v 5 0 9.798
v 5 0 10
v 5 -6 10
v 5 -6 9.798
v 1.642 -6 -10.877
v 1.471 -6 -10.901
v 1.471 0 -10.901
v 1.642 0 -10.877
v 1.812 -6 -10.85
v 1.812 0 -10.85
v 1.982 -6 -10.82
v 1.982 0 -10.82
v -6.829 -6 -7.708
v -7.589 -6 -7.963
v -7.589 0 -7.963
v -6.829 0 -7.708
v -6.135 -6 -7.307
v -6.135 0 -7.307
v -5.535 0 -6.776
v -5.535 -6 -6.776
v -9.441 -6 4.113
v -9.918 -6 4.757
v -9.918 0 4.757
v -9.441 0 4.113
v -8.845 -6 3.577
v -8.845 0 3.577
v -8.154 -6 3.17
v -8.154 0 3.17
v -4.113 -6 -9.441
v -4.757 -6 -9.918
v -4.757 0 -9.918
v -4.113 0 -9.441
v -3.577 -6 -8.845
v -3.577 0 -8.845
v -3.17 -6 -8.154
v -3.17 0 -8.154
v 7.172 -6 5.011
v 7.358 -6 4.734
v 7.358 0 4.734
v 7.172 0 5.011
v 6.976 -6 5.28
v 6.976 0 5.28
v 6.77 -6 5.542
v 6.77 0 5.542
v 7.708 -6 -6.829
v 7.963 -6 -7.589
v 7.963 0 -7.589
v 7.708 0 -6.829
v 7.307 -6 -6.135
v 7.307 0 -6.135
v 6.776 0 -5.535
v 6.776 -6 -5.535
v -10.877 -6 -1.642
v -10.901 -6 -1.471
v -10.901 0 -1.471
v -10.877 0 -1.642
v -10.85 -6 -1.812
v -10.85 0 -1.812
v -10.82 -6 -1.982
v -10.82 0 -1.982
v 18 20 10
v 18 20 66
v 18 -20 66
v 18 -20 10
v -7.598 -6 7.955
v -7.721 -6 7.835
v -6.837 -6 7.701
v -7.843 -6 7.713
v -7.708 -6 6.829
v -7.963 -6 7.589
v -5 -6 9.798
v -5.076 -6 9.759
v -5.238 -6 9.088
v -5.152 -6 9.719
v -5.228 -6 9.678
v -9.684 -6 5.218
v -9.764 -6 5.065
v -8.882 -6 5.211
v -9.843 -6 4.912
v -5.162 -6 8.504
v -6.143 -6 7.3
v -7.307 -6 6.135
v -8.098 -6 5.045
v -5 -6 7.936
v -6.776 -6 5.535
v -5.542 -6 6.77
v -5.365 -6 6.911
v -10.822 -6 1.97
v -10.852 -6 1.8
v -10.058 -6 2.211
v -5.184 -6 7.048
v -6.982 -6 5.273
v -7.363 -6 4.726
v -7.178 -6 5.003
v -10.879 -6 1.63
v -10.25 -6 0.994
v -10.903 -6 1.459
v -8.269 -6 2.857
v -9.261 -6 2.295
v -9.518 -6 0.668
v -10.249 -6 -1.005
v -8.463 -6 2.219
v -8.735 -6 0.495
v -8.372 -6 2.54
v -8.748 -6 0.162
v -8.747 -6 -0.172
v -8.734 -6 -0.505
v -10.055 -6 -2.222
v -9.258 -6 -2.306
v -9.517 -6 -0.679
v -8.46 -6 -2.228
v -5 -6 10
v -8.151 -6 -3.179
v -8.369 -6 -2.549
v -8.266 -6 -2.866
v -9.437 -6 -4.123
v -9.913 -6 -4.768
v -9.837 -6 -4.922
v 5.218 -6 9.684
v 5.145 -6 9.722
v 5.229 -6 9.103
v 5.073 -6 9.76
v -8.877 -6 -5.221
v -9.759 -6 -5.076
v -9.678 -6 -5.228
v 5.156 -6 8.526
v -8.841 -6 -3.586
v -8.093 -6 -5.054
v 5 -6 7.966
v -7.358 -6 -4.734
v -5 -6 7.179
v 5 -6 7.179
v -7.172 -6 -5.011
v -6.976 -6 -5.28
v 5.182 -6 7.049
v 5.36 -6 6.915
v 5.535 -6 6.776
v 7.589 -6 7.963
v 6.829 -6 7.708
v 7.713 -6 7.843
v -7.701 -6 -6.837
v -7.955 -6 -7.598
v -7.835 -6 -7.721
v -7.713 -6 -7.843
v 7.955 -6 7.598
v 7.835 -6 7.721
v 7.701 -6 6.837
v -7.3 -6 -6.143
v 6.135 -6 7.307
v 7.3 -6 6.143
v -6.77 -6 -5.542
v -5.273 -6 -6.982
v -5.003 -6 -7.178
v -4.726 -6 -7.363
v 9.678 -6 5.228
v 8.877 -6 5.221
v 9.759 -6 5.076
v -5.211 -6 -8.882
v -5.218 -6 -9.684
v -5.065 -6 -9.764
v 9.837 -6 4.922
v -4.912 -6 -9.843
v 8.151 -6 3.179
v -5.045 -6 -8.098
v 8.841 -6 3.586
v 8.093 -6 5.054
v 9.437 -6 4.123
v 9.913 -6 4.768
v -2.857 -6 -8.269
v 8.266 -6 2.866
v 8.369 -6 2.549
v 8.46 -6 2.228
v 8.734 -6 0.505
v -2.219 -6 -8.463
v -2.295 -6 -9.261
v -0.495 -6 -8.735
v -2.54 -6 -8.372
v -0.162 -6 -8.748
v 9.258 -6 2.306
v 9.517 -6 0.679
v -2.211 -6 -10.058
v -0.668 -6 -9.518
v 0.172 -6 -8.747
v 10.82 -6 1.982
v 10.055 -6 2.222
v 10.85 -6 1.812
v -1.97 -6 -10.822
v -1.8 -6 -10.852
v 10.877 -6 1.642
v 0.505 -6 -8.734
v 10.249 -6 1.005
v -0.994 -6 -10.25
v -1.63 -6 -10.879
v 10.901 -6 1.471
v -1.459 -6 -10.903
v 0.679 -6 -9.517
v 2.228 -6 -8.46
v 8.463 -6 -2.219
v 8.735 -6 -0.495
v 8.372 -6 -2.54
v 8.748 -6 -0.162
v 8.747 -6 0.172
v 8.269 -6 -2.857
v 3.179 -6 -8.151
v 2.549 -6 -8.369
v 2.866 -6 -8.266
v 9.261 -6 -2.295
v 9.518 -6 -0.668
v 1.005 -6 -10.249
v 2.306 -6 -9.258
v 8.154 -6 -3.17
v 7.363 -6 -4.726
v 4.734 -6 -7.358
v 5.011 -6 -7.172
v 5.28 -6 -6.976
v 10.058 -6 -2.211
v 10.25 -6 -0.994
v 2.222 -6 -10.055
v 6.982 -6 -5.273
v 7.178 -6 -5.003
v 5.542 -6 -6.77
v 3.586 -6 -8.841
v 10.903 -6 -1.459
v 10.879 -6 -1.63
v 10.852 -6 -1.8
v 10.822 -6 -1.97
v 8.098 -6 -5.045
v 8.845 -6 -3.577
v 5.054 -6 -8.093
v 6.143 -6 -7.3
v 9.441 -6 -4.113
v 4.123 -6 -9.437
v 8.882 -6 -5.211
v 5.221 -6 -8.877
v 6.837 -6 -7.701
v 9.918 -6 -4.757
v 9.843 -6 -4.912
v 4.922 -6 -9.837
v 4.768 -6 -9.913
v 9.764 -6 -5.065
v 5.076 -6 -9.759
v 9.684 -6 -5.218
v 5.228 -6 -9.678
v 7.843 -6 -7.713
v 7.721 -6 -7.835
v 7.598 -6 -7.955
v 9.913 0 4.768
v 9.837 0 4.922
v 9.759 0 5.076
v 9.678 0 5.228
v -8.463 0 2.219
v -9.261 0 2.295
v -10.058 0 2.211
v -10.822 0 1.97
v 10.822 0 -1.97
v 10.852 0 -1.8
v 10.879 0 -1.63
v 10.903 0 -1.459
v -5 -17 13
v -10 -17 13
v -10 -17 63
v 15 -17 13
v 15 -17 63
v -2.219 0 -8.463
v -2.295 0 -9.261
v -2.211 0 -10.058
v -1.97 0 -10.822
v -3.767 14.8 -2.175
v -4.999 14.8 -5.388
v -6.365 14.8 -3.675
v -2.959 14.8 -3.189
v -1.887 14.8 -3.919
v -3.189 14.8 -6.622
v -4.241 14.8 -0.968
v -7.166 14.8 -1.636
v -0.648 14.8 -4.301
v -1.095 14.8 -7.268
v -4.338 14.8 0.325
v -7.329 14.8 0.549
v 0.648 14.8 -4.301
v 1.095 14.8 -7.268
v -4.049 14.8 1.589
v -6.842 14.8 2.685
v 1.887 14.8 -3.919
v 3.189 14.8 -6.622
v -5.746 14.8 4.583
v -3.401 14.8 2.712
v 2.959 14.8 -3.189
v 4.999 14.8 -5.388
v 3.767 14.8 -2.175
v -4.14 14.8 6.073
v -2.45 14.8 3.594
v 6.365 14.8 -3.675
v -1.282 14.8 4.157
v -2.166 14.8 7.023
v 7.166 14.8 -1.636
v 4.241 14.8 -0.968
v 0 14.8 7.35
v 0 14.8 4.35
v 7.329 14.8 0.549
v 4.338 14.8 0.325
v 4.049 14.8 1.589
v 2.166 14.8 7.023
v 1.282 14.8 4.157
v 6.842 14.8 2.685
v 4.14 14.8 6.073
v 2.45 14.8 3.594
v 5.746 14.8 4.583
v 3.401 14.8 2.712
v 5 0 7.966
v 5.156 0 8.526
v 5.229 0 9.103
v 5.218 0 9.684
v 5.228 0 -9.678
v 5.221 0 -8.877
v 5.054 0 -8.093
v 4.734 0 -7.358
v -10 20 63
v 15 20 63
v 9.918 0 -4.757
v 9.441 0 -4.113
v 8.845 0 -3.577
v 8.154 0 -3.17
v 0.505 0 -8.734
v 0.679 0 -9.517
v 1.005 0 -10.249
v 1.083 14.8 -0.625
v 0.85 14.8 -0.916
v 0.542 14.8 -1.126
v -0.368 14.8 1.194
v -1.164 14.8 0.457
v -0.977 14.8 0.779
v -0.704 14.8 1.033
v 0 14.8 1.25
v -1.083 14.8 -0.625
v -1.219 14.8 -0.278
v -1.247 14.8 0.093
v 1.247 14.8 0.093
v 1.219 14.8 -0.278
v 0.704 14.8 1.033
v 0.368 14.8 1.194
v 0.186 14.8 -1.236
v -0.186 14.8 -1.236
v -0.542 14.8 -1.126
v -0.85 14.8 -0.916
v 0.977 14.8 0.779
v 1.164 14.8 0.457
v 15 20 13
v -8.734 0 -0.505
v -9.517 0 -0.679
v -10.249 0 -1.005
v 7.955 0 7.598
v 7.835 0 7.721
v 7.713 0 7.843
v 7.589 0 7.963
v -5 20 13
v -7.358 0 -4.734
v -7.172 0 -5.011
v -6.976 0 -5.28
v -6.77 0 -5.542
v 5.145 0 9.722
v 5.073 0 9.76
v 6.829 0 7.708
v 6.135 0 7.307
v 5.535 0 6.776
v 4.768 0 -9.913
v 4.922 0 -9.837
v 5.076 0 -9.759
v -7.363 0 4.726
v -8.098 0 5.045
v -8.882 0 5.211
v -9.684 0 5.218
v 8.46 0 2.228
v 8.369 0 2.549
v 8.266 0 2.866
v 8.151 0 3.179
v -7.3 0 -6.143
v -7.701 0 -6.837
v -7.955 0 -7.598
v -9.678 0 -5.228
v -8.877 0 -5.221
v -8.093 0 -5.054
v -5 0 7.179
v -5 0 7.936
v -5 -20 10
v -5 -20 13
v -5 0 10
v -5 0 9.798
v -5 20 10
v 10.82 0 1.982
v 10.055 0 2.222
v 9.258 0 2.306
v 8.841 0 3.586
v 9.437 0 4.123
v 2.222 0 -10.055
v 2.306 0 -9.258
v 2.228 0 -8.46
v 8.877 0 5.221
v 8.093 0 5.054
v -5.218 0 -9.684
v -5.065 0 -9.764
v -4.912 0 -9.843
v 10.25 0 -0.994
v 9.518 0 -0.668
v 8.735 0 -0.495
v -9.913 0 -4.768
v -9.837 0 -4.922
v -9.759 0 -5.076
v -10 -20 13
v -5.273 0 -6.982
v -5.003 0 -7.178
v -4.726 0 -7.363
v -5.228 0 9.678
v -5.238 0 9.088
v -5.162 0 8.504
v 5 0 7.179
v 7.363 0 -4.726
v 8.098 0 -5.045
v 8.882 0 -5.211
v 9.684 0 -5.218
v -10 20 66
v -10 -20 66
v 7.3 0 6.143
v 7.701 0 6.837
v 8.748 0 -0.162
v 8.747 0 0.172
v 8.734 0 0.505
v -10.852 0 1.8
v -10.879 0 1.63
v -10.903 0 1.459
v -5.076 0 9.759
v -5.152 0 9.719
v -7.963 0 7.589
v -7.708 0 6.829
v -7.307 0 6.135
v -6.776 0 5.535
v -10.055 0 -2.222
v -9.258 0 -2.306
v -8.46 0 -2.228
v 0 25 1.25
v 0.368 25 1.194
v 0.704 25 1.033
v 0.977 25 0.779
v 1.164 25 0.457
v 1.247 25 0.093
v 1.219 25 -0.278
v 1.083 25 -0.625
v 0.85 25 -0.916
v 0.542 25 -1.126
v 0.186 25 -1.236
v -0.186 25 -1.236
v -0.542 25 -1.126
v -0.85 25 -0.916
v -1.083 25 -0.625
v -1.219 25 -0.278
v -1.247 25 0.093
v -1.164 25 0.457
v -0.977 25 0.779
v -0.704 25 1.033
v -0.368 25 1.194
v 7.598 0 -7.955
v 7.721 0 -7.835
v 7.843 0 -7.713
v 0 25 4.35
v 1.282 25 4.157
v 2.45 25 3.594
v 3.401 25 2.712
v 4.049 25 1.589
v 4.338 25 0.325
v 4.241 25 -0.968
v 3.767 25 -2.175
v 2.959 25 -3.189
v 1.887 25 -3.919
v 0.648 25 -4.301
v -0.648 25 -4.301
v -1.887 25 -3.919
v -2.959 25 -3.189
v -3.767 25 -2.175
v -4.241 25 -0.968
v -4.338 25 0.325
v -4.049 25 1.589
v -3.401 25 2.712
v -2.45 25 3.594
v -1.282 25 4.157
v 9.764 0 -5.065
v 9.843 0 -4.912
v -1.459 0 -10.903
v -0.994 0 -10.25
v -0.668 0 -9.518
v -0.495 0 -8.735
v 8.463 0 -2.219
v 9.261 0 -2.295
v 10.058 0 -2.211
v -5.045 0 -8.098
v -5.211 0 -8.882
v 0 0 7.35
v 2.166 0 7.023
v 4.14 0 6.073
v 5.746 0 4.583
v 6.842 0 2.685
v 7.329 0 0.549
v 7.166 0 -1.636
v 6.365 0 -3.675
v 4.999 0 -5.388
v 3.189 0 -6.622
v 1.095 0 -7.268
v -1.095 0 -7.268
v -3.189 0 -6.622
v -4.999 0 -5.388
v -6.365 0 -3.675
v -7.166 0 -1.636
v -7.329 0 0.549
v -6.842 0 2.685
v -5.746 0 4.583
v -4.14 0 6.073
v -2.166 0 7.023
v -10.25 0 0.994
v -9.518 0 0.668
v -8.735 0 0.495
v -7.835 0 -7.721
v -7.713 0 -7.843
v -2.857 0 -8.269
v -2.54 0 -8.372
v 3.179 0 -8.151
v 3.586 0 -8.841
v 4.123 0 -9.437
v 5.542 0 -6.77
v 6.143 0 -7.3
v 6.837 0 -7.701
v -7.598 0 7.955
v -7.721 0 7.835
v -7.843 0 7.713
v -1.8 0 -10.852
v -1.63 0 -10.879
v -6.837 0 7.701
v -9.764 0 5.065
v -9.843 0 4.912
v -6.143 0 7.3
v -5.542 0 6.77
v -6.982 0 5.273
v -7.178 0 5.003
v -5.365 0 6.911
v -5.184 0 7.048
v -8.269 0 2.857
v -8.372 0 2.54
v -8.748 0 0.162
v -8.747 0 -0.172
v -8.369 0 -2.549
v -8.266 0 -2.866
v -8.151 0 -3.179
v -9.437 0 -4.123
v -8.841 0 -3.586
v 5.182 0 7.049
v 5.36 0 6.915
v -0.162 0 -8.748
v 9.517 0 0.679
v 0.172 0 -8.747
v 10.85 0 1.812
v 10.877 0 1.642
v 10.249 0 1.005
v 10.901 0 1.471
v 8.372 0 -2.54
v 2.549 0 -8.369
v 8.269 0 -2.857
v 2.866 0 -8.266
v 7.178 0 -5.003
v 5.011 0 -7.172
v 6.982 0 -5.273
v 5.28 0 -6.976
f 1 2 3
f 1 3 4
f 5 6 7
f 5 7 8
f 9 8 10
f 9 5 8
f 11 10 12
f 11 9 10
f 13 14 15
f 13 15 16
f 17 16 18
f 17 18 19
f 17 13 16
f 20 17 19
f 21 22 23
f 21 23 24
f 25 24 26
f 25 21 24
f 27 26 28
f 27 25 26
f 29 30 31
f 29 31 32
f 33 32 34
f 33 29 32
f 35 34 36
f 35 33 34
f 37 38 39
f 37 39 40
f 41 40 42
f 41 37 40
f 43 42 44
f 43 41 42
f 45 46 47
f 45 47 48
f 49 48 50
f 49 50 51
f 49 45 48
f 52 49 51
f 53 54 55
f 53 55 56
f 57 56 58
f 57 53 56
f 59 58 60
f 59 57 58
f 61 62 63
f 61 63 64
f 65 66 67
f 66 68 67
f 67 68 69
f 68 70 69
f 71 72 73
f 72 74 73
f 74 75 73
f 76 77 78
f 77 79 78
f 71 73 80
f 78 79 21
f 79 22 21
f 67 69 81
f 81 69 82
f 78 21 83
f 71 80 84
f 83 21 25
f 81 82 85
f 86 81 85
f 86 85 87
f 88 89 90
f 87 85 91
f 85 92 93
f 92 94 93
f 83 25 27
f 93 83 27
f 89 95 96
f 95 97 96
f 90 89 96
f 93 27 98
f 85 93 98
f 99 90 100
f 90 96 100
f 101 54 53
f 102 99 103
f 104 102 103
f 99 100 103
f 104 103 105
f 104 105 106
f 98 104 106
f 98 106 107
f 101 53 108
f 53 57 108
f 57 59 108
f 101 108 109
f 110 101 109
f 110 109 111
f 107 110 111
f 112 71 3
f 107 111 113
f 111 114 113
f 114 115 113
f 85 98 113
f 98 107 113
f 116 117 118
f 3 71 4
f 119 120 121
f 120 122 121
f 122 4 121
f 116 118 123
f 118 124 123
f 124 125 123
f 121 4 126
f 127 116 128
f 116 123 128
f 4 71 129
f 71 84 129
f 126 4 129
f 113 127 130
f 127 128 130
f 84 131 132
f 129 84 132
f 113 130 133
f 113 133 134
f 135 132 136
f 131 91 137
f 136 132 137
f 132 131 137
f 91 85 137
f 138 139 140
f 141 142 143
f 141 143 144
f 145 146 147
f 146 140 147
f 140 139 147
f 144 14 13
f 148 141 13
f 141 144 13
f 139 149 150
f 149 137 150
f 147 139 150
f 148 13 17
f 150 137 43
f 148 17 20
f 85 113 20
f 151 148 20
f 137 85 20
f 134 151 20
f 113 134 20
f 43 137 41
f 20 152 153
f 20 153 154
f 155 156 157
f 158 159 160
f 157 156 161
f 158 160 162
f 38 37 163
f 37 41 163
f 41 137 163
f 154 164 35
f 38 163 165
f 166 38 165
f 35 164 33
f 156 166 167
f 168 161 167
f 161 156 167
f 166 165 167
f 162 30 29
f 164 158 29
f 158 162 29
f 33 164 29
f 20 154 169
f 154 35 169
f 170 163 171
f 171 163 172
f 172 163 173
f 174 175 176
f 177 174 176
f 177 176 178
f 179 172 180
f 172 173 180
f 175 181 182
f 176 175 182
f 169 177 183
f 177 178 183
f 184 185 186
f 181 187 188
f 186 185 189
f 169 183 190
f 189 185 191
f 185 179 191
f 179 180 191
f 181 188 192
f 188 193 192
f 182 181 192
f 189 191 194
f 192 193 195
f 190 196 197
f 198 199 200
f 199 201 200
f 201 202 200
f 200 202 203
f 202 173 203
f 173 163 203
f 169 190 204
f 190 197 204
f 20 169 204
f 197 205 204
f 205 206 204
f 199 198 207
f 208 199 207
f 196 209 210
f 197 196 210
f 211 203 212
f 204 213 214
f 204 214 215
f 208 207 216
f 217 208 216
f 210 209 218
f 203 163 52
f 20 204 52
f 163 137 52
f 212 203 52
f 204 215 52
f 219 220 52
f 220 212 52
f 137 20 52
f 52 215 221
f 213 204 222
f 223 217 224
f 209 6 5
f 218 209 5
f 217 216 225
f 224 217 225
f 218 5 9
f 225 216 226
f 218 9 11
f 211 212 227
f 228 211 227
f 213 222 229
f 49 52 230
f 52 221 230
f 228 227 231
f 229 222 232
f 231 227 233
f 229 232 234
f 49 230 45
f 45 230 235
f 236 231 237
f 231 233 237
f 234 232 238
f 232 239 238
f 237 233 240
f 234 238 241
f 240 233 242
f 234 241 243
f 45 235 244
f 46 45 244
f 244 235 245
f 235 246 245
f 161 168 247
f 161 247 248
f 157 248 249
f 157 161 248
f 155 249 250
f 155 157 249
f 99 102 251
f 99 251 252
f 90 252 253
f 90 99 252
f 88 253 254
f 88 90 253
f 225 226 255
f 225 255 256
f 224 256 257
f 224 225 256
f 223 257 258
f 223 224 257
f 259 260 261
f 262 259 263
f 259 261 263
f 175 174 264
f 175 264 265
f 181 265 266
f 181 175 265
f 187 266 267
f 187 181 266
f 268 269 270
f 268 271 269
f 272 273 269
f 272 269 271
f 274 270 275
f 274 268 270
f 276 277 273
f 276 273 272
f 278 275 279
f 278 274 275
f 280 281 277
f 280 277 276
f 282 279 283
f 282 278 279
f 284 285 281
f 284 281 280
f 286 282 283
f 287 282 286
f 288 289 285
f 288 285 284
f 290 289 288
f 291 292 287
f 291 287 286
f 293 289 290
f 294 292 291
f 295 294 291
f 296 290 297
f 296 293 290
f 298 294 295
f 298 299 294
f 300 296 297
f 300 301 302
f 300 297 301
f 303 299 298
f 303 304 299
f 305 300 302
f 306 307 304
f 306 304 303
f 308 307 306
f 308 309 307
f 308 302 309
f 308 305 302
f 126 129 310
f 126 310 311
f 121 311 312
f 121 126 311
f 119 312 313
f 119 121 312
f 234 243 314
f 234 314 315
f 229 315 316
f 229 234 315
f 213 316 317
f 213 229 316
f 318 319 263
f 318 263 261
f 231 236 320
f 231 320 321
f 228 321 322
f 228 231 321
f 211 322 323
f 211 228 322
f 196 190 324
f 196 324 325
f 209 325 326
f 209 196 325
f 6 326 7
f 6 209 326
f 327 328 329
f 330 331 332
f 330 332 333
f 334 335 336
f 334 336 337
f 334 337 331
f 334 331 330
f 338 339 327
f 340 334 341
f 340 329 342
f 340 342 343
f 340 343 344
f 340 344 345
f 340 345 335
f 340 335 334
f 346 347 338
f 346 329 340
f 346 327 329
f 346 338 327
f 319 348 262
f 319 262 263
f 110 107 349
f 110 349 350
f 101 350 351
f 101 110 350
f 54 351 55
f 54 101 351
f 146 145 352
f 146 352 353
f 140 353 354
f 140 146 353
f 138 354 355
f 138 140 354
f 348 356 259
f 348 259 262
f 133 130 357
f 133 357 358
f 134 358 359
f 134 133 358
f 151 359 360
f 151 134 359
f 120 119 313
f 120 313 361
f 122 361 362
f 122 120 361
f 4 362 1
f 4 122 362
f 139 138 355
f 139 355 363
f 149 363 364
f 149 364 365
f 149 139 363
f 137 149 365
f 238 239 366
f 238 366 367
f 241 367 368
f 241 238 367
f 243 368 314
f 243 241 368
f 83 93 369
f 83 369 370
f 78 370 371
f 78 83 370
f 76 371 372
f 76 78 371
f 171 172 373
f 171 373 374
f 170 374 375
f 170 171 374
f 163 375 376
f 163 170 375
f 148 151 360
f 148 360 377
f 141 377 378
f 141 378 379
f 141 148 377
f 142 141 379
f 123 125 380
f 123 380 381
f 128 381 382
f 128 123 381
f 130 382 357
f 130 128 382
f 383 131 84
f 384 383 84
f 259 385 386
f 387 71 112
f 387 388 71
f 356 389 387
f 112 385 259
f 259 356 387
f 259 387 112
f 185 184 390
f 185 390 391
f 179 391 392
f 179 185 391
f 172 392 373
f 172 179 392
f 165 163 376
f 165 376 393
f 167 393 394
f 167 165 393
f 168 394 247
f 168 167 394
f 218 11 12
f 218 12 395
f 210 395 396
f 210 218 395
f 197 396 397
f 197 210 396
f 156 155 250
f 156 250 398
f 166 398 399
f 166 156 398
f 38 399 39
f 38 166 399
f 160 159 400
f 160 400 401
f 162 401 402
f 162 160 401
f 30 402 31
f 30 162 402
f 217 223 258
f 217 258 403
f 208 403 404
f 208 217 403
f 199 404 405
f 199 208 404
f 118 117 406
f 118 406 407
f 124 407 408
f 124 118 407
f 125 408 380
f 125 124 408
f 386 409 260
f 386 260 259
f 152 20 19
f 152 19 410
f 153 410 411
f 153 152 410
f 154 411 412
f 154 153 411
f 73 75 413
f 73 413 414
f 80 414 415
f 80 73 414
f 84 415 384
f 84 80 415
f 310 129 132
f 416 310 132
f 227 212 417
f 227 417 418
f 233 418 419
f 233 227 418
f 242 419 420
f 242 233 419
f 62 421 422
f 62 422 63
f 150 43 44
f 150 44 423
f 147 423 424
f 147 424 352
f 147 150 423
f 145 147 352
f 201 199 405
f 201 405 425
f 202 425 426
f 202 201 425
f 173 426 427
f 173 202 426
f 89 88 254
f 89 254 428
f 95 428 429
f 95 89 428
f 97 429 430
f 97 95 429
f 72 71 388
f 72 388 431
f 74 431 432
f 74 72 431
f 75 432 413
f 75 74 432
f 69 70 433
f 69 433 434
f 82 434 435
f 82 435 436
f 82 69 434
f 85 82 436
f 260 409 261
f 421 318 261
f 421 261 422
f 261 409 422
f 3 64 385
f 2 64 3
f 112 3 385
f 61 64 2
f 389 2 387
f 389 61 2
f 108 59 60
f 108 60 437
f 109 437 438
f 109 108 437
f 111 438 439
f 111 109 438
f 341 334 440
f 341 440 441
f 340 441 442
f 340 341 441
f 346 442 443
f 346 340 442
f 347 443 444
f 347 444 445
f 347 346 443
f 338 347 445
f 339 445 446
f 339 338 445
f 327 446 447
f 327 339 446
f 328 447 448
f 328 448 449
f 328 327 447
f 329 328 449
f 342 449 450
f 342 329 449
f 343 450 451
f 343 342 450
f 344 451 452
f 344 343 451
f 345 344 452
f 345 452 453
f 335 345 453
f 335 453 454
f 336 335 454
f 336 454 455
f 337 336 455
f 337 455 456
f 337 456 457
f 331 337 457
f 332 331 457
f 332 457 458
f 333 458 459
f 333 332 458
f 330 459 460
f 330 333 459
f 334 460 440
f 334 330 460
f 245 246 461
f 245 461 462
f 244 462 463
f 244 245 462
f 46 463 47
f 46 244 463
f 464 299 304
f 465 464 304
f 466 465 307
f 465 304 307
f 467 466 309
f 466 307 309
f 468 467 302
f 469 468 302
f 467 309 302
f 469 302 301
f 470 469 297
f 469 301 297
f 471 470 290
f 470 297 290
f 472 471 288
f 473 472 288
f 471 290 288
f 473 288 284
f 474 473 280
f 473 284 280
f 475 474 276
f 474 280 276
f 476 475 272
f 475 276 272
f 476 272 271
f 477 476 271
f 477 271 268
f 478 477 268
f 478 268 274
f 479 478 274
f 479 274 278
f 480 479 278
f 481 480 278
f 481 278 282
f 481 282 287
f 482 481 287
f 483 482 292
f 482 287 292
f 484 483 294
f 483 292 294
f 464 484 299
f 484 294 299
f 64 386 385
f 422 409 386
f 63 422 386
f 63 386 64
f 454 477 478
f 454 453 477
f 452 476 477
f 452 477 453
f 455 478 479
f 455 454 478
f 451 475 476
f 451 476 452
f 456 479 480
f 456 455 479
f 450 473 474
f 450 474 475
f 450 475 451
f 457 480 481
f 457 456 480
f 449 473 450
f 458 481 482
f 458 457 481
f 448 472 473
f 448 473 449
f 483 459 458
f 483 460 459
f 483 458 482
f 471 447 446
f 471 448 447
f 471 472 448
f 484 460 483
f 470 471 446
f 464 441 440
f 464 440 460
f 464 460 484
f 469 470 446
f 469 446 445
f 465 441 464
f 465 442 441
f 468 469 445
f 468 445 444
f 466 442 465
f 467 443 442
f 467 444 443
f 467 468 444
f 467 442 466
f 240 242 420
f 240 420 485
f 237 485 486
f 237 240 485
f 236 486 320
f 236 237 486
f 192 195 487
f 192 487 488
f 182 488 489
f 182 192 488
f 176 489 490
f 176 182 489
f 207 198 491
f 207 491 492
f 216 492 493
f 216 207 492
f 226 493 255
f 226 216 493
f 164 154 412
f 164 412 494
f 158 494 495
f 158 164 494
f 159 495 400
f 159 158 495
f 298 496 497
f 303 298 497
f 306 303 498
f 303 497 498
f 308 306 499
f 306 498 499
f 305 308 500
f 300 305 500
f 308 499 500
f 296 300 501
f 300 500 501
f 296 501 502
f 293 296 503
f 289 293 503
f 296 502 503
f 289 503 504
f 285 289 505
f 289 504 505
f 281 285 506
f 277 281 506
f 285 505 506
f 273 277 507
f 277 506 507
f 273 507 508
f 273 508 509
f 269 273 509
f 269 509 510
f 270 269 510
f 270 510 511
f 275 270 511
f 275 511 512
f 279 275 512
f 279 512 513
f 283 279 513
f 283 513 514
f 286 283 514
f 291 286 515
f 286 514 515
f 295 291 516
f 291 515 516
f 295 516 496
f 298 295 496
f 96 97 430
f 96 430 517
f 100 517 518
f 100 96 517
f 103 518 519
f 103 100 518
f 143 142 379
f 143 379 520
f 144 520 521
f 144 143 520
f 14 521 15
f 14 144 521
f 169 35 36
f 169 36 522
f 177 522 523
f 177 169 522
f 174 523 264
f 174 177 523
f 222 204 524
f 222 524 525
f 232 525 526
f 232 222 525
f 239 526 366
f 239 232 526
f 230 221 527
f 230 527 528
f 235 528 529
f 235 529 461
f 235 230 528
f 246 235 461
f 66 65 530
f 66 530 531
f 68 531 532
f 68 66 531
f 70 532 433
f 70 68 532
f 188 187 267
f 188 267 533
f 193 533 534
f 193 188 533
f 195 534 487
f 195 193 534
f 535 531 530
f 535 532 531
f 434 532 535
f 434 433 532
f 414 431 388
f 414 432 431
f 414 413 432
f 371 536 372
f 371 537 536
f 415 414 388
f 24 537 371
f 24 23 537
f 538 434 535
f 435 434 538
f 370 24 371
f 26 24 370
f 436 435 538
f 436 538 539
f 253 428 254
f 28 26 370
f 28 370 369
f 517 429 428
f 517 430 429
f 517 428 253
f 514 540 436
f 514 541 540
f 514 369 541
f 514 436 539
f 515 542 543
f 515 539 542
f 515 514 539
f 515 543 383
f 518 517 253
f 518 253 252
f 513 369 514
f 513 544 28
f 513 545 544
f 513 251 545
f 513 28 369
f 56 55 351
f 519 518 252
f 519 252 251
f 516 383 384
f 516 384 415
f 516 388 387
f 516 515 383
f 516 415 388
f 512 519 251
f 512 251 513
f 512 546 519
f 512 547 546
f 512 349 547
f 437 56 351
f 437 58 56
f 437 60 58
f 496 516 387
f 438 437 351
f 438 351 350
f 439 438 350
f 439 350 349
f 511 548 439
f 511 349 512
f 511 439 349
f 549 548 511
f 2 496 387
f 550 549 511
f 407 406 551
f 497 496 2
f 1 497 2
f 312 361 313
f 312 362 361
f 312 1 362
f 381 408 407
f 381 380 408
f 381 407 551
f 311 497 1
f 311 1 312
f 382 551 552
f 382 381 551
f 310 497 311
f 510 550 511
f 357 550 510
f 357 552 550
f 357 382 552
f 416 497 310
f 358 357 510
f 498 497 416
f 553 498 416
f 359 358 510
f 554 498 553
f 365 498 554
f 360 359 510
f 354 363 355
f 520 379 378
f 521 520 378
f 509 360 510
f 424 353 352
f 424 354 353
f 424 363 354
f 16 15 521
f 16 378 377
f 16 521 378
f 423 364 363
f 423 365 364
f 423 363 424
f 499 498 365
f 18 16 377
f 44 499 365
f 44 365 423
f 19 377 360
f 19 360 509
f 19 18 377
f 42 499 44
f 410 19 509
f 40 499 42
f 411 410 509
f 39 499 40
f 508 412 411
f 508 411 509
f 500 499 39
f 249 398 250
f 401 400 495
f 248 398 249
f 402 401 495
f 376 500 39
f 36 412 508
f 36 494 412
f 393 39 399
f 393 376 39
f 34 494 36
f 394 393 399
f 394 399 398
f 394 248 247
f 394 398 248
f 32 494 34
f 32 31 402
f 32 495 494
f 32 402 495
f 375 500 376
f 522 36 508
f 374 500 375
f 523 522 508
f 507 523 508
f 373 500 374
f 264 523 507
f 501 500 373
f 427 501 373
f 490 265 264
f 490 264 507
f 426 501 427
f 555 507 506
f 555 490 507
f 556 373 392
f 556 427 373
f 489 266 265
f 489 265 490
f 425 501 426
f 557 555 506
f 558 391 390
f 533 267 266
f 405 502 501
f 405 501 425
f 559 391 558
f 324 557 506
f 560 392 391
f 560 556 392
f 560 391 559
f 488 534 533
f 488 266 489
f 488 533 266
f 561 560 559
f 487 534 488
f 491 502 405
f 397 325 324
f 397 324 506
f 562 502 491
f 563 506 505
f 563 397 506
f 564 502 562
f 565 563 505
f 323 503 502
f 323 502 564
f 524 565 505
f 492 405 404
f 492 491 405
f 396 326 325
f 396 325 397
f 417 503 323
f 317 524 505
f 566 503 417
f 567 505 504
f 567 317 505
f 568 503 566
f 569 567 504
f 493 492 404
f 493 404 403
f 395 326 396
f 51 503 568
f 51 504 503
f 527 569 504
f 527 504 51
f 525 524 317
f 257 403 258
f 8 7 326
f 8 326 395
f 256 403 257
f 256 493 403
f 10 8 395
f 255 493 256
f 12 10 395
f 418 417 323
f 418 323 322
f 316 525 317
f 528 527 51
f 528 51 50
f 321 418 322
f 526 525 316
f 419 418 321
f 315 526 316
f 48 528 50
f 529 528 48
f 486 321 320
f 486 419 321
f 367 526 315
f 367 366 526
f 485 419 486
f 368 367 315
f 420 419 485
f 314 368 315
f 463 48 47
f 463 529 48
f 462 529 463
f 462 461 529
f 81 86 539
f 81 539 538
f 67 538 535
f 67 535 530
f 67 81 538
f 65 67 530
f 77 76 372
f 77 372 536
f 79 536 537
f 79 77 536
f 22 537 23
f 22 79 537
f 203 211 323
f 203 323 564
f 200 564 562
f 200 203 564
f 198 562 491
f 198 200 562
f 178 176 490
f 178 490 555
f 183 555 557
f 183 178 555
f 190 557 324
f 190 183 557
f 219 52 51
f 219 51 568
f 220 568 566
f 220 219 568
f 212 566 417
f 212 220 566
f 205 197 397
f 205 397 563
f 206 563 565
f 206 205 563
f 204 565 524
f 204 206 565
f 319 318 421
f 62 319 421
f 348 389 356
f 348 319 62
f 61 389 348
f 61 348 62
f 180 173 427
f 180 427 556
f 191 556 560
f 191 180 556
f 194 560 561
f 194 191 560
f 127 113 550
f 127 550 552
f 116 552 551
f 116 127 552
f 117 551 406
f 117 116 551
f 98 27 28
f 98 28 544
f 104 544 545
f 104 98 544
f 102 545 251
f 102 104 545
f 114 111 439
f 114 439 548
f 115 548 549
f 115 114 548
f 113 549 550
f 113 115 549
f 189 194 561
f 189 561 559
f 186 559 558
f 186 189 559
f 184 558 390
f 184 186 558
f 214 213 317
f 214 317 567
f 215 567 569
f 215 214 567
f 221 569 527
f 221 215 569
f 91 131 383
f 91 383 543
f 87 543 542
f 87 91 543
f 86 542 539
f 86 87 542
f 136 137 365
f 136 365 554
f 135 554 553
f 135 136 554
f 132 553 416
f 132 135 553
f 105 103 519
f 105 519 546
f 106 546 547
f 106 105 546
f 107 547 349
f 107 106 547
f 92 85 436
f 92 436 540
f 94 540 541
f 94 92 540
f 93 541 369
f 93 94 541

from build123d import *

# Parameters (mm, degrees)
EXTRUDE_1_DEPTH = 6
EXTRUDE_2_DEPTH = 20
SKETCH_3_W      = 25
SKETCH_3_H      = 50
EXTRUDE_3_DEPTH = 3
EXTRUDE_4_DEPTH = 6
SKETCH_5_R      = 7.35
EXTRUDE_5_DEPTH = 14.8
SKETCH_6_R      = 4.35
SKETCH_6_R_2    = 1.25
EXTRUDE_6_DEPTH = 10.2


with BuildPart() as part:
    # 草图1 → 凸台-拉伸1 (new body)
    with BuildSketch(Plane(origin=(0, 0, 0), x_dir=(1, 0, 0), z_dir=(0, 1, 0))):
        with BuildLine():
            Line((-5, 0), (-5, -13))
            Line((-5, -13), (15, -13))
            Line((15, -13), (15, -63))
            Line((15, -63), (-10, -63))
            Line((-10, -63), (-10, -66))
            Line((-10, -66), (18, -66))
            Line((18, -66), (18, -10))
            Line((18, -10), (5, -10))
            Line((5, -10), (5, 0))
            ThreePointArc((5, 0), (0, 5), (-5, 0))
        make_face()
    extrude(amount=-EXTRUDE_1_DEPTH)

    # 草图2 → 凸台-拉伸2 (add, symmetric)
    with BuildSketch(Plane(origin=(0, 0, 0), x_dir=(1, 0, 0), z_dir=(0, 1, 0))):
        Polygon((-5, -13), (15, -13), (15, -63), (-10, -63), (-10, -66), (18, -66), (18, -10), (-5, -10), align=None)
    extrude(amount=EXTRUDE_2_DEPTH, both=True)

    # 草图3 → 凸台-拉伸3 (add)
    with BuildSketch(Plane.XZ.offset(20)):
        with Locations((2.5, 38)):
            Rectangle(SKETCH_3_W, SKETCH_3_H)
    extrude(amount=-EXTRUDE_3_DEPTH)

    # 草图4 → 凸台-拉伸4 (add)
    with BuildSketch(Plane.XZ.offset(6)):
        with BuildLine():
            ThreePointArc((-0.504732798, 8.734428762), (-0.823506466, 9.891100464), (-1.470958285, 10.901205517))
            ThreePointArc((-1.470958285, 10.901205517), (-1.726760313, 10.86362273), (-1.981608382, 10.820038273))
            ThreePointArc((-1.981608382, 10.820038273), (-2.283953757, 9.65896405), (-2.228374617, 8.460457882))
            ThreePointArc((-2.228374617, 8.460457882), (-2.708170263, 8.319303747), (-3.17911634, 8.150964378))
            ThreePointArc((-3.17911634, 8.150964378), (-3.839719327, 9.152518056), (-4.767622226, 9.913111434))
            ThreePointArc((-4.767622226, 9.913111434), (-4.999290692, 9.798320906), (-5.228197271, 9.678117239))
            ThreePointArc((-5.228197271, 9.678117239), (-5.156953143, 8.480440175), (-4.733735466, 7.357767973))
            ThreePointArc((-4.733735466, 7.357767973), (-5.146429214, 7.075257405), (-5.542305825, 6.76962681))
            ThreePointArc((-5.542305825, 6.76962681), (-6.480073708, 7.518023412), (-7.597598086, 7.954652936))
            ThreePointArc((-7.597598086, 7.954652936), (-7.782455665, 7.773891163), (-7.963013783, 7.588834659))
            ThreePointArc((-7.963013783, 7.588834659), (-7.525154025, 6.471791729), (-6.775725305, 5.53484847))
            ThreePointArc((-6.775725305, 5.53484847), (-7.080919818, 5.138635571), (-7.3629758, 4.725631002))
            ThreePointArc((-7.3629758, 4.725631002), (-8.486113324, 5.147612255), (-9.683868109, 5.217537585))
            ThreePointArc((-9.683868109, 5.217537585), (-9.803819655, 4.988498789), (-9.918355025, 4.756704069))
            ThreePointArc((-9.918355025, 4.756704069), (-9.1567404, 3.829639217), (-8.154459943, 3.170139435))
            ThreePointArc((-8.154459943, 3.170139435), (-8.322280653, 2.699008286), (-8.462906403, 2.219057507))
            ThreePointArc((-8.462906403, 2.219057507), (-9.661473042, 2.273316945), (-10.82221365, 1.969693302))
            ThreePointArc((-10.82221365, 1.969693302), (-10.86551747, 1.714797397), (-10.902818572, 1.458954141))
            ThreePointArc((-10.902818572, 1.458954141), (-9.892001226, 0.812614936), (-8.734979226, 0.495115065))
            ThreePointArc((-8.734979226, 0.495115065), (-8.748998674, -0.004816736), (-8.734428762, -0.504732798))
            ThreePointArc((-8.734428762, -0.504732798), (-9.891100464, -0.823506466), (-10.901205517, -1.470958285))
            ThreePointArc((-10.901205517, -1.470958285), (-10.86362273, -1.726760313), (-10.820038273, -1.981608382))
            ThreePointArc((-10.820038273, -1.981608382), (-9.65896405, -2.283953757), (-8.460457882, -2.228374617))
            ThreePointArc((-8.460457882, -2.228374617), (-8.319303747, -2.708170263), (-8.150964378, -3.17911634))
            ThreePointArc((-8.150964378, -3.17911634), (-9.152518056, -3.839719327), (-9.913111434, -4.767622226))
            ThreePointArc((-9.913111434, -4.767622226), (-9.798320906, -4.999290692), (-9.678117239, -5.228197271))
            ThreePointArc((-9.678117239, -5.228197271), (-8.480440175, -5.156953143), (-7.357767973, -4.733735466))
            ThreePointArc((-7.357767973, -4.733735466), (-7.075257405, -5.146429214), (-6.76962681, -5.542305825))
            ThreePointArc((-6.76962681, -5.542305825), (-7.518023412, -6.480073708), (-7.954652936, -7.597598086))
            ThreePointArc((-7.954652936, -7.597598086), (-7.773891163, -7.782455665), (-7.588834659, -7.963013783))
            ThreePointArc((-7.588834659, -7.963013783), (-6.471791729, -7.525154025), (-5.53484847, -6.775725305))
            ThreePointArc((-5.53484847, -6.775725305), (-5.138635571, -7.080919818), (-4.725631002, -7.3629758))
            ThreePointArc((-4.725631002, -7.3629758), (-5.147612255, -8.486113324), (-5.217537585, -9.683868109))
            ThreePointArc((-5.217537585, -9.683868109), (-4.988498789, -9.803819655), (-4.756704069, -9.918355025))
            ThreePointArc((-4.756704069, -9.918355025), (-3.829639217, -9.1567404), (-3.170139435, -8.154459943))
            ThreePointArc((-3.170139435, -8.154459943), (-2.699008286, -8.322280653), (-2.219057507, -8.462906403))
            ThreePointArc((-2.219057507, -8.462906403), (-2.273316945, -9.661473042), (-1.969693302, -10.82221365))
            ThreePointArc((-1.969693302, -10.82221365), (-1.714797397, -10.86551747), (-1.458954141, -10.902818572))
            ThreePointArc((-1.458954141, -10.902818572), (-0.812614936, -9.892001226), (-0.495115065, -8.734979226))
            ThreePointArc((-0.495115065, -8.734979226), (0.004816736, -8.748998674), (0.504732798, -8.734428762))
            ThreePointArc((0.504732798, -8.734428762), (0.823506466, -9.891100464), (1.470958285, -10.901205517))
            ThreePointArc((1.470958285, -10.901205517), (1.726760313, -10.86362273), (1.981608382, -10.820038273))
            ThreePointArc((1.981608382, -10.820038273), (2.283953757, -9.65896405), (2.228374617, -8.460457882))
            ThreePointArc((2.228374617, -8.460457882), (2.708170263, -8.319303747), (3.17911634, -8.150964378))
            ThreePointArc((3.17911634, -8.150964378), (3.839719327, -9.152518056), (4.767622226, -9.913111434))
            ThreePointArc((4.767622226, -9.913111434), (4.999290692, -9.798320906), (5.228197271, -9.678117239))
            ThreePointArc((5.228197271, -9.678117239), (5.156953143, -8.480440175), (4.733735466, -7.357767973))
            ThreePointArc((4.733735466, -7.357767973), (5.146429214, -7.075257405), (5.542305825, -6.76962681))
            ThreePointArc((5.542305825, -6.76962681), (6.480073708, -7.518023412), (7.597598086, -7.954652936))
            ThreePointArc((7.597598086, -7.954652936), (7.782455665, -7.773891163), (7.963013783, -7.588834659))
            ThreePointArc((7.963013783, -7.588834659), (7.525154025, -6.471791729), (6.775725305, -5.53484847))
            ThreePointArc((6.775725305, -5.53484847), (7.080919818, -5.138635571), (7.3629758, -4.725631002))
            ThreePointArc((7.3629758, -4.725631002), (8.486113324, -5.147612255), (9.683868109, -5.217537585))
            ThreePointArc((9.683868109, -5.217537585), (9.803819655, -4.988498789), (9.918355025, -4.756704069))
            ThreePointArc((9.918355025, -4.756704069), (9.1567404, -3.829639217), (8.154459943, -3.170139435))
            ThreePointArc((8.154459943, -3.170139435), (8.322280653, -2.699008286), (8.462906403, -2.219057507))
            ThreePointArc((8.462906403, -2.219057507), (9.661473042, -2.273316945), (10.82221365, -1.969693302))
            ThreePointArc((10.82221365, -1.969693302), (10.86551747, -1.714797397), (10.902818572, -1.458954141))
            ThreePointArc((10.902818572, -1.458954141), (9.892001226, -0.812614936), (8.734979226, -0.495115065))
            ThreePointArc((8.734979226, -0.495115065), (8.748998674, 0.004816736), (8.734428762, 0.504732798))
            ThreePointArc((8.734428762, 0.504732798), (9.891100464, 0.823506466), (10.901205517, 1.470958285))
            ThreePointArc((10.901205517, 1.470958285), (10.86362273, 1.726760313), (10.820038273, 1.981608382))
            ThreePointArc((10.820038273, 1.981608382), (9.65896405, 2.283953757), (8.460457882, 2.228374617))
            ThreePointArc((8.460457882, 2.228374617), (8.319303747, 2.708170263), (8.150964378, 3.17911634))
            ThreePointArc((8.150964378, 3.17911634), (9.152518056, 3.839719327), (9.913111434, 4.767622226))
            ThreePointArc((9.913111434, 4.767622226), (9.798320906, 4.999290692), (9.678117239, 5.228197271))
            ThreePointArc((9.678117239, 5.228197271), (8.480440175, 5.156953143), (7.357767973, 4.733735466))
            ThreePointArc((7.357767973, 4.733735466), (7.075257405, 5.146429214), (6.76962681, 5.542305825))
            ThreePointArc((6.76962681, 5.542305825), (7.518023412, 6.480073708), (7.954652936, 7.597598086))
            ThreePointArc((7.954652936, 7.597598086), (7.773891163, 7.782455665), (7.588834659, 7.963013783))
            ThreePointArc((7.588834659, 7.963013783), (6.471791729, 7.525154025), (5.53484847, 6.775725305))
            ThreePointArc((5.53484847, 6.775725305), (5.138635571, 7.080919818), (4.725631002, 7.3629758))
            ThreePointArc((4.725631002, 7.3629758), (5.147612255, 8.486113324), (5.217537585, 9.683868109))
            ThreePointArc((5.217537585, 9.683868109), (4.988498789, 9.803819655), (4.756704069, 9.918355025))
            ThreePointArc((4.756704069, 9.918355025), (3.829639217, 9.1567404), (3.170139435, 8.154459943))
            ThreePointArc((3.170139435, 8.154459943), (2.699008286, 8.322280653), (2.219057507, 8.462906403))
            ThreePointArc((2.219057507, 8.462906403), (2.273316945, 9.661473042), (1.969693302, 10.82221365))
            ThreePointArc((1.969693302, 10.82221365), (1.714797397, 10.86551747), (1.458954141, 10.902818572))
            ThreePointArc((1.458954141, 10.902818572), (0.812614936, 9.892001226), (0.495115065, 8.734979226))
            ThreePointArc((0.495115065, 8.734979226), (-0.004816736, 8.748998674), (-0.504732798, 8.734428762))
        make_face()
    extrude(amount=-EXTRUDE_4_DEPTH)

    # 草图5 → 凸台-拉伸5 (add)
    with BuildSketch(Plane(origin=(0, 0, 0), x_dir=(1, 0, 0), z_dir=(0, 1, 0))):
        with Locations(Location((0, 0, 0), (0, 0, 270))):
            Circle(SKETCH_5_R)
    extrude(amount=EXTRUDE_5_DEPTH)

    # 草图6 → 凸台-拉伸6 (add)
    with BuildSketch(Plane(origin=(0, 14.8, 0), x_dir=(1, 0, 0), z_dir=(0, 1, 0))):
        with Locations(Location((0, 0, 0), (0, 0, 270))):
            Circle(SKETCH_6_R)
        with Locations(Location((0, 0, 0), (0, 0, 270))):
            Circle(SKETCH_6_R_2, mode=Mode.SUBTRACT)
    extrude(amount=EXTRUDE_6_DEPTH)


solid = part.part
